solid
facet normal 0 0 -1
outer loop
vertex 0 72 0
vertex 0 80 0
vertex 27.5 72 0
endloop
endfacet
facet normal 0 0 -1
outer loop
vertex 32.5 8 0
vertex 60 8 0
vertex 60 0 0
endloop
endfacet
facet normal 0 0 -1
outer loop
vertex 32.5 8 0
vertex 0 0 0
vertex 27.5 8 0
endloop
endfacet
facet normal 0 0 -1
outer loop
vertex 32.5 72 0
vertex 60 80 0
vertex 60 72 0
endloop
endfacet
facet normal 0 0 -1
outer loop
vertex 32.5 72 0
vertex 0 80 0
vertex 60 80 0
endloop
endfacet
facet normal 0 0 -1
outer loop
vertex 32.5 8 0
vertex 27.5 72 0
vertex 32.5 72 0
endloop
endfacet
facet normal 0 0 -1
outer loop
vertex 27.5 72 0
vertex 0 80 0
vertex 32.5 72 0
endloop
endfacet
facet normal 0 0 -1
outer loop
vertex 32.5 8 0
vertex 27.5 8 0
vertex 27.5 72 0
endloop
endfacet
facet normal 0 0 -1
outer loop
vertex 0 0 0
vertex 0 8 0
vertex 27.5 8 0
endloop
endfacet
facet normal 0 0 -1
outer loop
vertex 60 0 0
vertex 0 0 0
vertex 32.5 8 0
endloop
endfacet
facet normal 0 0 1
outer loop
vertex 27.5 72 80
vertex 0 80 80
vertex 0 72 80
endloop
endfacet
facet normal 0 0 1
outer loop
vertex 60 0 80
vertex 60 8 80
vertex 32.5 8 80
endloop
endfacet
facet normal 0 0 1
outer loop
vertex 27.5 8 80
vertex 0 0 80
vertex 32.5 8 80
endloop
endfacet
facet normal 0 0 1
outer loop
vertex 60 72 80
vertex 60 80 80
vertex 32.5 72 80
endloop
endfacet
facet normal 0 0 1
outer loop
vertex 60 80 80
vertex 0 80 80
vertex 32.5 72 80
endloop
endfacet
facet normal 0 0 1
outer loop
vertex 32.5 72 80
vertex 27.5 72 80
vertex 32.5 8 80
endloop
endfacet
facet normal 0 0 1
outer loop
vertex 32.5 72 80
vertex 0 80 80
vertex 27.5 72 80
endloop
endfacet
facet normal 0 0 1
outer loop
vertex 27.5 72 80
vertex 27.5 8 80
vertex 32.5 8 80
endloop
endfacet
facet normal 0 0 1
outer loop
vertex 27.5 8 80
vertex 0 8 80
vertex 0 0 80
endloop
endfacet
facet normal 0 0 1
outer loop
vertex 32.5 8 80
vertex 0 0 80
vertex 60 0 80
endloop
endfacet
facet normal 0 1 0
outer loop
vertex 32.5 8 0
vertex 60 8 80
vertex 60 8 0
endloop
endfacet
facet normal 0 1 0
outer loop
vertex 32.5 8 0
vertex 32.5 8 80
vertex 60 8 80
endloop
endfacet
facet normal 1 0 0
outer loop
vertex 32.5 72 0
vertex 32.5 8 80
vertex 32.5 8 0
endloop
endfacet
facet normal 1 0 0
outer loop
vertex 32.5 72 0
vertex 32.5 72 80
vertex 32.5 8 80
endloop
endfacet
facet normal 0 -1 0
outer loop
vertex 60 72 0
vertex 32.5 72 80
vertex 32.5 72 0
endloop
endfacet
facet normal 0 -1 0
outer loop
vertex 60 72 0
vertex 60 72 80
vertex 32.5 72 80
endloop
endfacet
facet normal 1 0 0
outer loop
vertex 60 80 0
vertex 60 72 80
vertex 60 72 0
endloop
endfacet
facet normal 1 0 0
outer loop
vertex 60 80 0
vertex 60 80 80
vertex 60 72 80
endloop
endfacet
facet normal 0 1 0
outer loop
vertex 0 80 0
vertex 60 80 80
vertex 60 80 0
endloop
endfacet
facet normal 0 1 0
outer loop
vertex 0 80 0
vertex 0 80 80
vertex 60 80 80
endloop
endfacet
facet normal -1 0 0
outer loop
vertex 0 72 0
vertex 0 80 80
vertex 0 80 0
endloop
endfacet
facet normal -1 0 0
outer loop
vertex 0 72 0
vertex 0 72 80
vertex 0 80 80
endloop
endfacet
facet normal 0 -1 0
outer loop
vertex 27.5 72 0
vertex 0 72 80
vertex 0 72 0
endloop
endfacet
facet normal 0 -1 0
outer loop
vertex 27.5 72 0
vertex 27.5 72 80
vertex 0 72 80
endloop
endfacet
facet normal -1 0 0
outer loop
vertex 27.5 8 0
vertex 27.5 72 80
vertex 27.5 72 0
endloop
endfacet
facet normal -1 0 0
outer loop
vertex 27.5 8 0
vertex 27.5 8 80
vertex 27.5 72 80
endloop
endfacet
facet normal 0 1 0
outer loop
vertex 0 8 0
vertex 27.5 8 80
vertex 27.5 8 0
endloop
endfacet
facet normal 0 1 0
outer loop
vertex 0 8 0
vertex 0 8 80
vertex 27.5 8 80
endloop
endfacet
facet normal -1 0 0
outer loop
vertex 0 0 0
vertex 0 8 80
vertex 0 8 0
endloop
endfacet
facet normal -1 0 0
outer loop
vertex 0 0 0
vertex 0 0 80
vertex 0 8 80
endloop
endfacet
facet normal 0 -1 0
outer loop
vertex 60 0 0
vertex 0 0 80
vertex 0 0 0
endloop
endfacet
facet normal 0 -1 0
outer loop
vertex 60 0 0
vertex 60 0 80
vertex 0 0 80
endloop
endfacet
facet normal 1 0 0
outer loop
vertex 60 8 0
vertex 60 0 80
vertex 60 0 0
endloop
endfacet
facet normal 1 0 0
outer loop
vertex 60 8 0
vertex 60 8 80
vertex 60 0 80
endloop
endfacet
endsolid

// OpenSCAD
$fn = 32;

// ----------------------------------------------------------------------
// Structural section: ibeam 60 x 80 mm
// ----------------------------------------------------------------------

// --- parameters (mm) ---
sec_w = 60;               // section width, X
sec_h = 80;               // section height, Y
flange_t = 8;             // flange thickness
web_t = 5;                // web thickness
plate_t = 80;             // cut length, Z (extrusion height)

profile = [[0, 0], [60, 0], [60, 8], [32.5, 8], [32.5, 72], [60, 72], [60, 80], [0, 80], [0, 72], [27.5, 72], [27.5, 8], [0, 8]];  // primary outline, 12 points, counter clockwise

// --- the one profile operation ---
linear_extrude(height = plate_t) polygon(points = profile);
